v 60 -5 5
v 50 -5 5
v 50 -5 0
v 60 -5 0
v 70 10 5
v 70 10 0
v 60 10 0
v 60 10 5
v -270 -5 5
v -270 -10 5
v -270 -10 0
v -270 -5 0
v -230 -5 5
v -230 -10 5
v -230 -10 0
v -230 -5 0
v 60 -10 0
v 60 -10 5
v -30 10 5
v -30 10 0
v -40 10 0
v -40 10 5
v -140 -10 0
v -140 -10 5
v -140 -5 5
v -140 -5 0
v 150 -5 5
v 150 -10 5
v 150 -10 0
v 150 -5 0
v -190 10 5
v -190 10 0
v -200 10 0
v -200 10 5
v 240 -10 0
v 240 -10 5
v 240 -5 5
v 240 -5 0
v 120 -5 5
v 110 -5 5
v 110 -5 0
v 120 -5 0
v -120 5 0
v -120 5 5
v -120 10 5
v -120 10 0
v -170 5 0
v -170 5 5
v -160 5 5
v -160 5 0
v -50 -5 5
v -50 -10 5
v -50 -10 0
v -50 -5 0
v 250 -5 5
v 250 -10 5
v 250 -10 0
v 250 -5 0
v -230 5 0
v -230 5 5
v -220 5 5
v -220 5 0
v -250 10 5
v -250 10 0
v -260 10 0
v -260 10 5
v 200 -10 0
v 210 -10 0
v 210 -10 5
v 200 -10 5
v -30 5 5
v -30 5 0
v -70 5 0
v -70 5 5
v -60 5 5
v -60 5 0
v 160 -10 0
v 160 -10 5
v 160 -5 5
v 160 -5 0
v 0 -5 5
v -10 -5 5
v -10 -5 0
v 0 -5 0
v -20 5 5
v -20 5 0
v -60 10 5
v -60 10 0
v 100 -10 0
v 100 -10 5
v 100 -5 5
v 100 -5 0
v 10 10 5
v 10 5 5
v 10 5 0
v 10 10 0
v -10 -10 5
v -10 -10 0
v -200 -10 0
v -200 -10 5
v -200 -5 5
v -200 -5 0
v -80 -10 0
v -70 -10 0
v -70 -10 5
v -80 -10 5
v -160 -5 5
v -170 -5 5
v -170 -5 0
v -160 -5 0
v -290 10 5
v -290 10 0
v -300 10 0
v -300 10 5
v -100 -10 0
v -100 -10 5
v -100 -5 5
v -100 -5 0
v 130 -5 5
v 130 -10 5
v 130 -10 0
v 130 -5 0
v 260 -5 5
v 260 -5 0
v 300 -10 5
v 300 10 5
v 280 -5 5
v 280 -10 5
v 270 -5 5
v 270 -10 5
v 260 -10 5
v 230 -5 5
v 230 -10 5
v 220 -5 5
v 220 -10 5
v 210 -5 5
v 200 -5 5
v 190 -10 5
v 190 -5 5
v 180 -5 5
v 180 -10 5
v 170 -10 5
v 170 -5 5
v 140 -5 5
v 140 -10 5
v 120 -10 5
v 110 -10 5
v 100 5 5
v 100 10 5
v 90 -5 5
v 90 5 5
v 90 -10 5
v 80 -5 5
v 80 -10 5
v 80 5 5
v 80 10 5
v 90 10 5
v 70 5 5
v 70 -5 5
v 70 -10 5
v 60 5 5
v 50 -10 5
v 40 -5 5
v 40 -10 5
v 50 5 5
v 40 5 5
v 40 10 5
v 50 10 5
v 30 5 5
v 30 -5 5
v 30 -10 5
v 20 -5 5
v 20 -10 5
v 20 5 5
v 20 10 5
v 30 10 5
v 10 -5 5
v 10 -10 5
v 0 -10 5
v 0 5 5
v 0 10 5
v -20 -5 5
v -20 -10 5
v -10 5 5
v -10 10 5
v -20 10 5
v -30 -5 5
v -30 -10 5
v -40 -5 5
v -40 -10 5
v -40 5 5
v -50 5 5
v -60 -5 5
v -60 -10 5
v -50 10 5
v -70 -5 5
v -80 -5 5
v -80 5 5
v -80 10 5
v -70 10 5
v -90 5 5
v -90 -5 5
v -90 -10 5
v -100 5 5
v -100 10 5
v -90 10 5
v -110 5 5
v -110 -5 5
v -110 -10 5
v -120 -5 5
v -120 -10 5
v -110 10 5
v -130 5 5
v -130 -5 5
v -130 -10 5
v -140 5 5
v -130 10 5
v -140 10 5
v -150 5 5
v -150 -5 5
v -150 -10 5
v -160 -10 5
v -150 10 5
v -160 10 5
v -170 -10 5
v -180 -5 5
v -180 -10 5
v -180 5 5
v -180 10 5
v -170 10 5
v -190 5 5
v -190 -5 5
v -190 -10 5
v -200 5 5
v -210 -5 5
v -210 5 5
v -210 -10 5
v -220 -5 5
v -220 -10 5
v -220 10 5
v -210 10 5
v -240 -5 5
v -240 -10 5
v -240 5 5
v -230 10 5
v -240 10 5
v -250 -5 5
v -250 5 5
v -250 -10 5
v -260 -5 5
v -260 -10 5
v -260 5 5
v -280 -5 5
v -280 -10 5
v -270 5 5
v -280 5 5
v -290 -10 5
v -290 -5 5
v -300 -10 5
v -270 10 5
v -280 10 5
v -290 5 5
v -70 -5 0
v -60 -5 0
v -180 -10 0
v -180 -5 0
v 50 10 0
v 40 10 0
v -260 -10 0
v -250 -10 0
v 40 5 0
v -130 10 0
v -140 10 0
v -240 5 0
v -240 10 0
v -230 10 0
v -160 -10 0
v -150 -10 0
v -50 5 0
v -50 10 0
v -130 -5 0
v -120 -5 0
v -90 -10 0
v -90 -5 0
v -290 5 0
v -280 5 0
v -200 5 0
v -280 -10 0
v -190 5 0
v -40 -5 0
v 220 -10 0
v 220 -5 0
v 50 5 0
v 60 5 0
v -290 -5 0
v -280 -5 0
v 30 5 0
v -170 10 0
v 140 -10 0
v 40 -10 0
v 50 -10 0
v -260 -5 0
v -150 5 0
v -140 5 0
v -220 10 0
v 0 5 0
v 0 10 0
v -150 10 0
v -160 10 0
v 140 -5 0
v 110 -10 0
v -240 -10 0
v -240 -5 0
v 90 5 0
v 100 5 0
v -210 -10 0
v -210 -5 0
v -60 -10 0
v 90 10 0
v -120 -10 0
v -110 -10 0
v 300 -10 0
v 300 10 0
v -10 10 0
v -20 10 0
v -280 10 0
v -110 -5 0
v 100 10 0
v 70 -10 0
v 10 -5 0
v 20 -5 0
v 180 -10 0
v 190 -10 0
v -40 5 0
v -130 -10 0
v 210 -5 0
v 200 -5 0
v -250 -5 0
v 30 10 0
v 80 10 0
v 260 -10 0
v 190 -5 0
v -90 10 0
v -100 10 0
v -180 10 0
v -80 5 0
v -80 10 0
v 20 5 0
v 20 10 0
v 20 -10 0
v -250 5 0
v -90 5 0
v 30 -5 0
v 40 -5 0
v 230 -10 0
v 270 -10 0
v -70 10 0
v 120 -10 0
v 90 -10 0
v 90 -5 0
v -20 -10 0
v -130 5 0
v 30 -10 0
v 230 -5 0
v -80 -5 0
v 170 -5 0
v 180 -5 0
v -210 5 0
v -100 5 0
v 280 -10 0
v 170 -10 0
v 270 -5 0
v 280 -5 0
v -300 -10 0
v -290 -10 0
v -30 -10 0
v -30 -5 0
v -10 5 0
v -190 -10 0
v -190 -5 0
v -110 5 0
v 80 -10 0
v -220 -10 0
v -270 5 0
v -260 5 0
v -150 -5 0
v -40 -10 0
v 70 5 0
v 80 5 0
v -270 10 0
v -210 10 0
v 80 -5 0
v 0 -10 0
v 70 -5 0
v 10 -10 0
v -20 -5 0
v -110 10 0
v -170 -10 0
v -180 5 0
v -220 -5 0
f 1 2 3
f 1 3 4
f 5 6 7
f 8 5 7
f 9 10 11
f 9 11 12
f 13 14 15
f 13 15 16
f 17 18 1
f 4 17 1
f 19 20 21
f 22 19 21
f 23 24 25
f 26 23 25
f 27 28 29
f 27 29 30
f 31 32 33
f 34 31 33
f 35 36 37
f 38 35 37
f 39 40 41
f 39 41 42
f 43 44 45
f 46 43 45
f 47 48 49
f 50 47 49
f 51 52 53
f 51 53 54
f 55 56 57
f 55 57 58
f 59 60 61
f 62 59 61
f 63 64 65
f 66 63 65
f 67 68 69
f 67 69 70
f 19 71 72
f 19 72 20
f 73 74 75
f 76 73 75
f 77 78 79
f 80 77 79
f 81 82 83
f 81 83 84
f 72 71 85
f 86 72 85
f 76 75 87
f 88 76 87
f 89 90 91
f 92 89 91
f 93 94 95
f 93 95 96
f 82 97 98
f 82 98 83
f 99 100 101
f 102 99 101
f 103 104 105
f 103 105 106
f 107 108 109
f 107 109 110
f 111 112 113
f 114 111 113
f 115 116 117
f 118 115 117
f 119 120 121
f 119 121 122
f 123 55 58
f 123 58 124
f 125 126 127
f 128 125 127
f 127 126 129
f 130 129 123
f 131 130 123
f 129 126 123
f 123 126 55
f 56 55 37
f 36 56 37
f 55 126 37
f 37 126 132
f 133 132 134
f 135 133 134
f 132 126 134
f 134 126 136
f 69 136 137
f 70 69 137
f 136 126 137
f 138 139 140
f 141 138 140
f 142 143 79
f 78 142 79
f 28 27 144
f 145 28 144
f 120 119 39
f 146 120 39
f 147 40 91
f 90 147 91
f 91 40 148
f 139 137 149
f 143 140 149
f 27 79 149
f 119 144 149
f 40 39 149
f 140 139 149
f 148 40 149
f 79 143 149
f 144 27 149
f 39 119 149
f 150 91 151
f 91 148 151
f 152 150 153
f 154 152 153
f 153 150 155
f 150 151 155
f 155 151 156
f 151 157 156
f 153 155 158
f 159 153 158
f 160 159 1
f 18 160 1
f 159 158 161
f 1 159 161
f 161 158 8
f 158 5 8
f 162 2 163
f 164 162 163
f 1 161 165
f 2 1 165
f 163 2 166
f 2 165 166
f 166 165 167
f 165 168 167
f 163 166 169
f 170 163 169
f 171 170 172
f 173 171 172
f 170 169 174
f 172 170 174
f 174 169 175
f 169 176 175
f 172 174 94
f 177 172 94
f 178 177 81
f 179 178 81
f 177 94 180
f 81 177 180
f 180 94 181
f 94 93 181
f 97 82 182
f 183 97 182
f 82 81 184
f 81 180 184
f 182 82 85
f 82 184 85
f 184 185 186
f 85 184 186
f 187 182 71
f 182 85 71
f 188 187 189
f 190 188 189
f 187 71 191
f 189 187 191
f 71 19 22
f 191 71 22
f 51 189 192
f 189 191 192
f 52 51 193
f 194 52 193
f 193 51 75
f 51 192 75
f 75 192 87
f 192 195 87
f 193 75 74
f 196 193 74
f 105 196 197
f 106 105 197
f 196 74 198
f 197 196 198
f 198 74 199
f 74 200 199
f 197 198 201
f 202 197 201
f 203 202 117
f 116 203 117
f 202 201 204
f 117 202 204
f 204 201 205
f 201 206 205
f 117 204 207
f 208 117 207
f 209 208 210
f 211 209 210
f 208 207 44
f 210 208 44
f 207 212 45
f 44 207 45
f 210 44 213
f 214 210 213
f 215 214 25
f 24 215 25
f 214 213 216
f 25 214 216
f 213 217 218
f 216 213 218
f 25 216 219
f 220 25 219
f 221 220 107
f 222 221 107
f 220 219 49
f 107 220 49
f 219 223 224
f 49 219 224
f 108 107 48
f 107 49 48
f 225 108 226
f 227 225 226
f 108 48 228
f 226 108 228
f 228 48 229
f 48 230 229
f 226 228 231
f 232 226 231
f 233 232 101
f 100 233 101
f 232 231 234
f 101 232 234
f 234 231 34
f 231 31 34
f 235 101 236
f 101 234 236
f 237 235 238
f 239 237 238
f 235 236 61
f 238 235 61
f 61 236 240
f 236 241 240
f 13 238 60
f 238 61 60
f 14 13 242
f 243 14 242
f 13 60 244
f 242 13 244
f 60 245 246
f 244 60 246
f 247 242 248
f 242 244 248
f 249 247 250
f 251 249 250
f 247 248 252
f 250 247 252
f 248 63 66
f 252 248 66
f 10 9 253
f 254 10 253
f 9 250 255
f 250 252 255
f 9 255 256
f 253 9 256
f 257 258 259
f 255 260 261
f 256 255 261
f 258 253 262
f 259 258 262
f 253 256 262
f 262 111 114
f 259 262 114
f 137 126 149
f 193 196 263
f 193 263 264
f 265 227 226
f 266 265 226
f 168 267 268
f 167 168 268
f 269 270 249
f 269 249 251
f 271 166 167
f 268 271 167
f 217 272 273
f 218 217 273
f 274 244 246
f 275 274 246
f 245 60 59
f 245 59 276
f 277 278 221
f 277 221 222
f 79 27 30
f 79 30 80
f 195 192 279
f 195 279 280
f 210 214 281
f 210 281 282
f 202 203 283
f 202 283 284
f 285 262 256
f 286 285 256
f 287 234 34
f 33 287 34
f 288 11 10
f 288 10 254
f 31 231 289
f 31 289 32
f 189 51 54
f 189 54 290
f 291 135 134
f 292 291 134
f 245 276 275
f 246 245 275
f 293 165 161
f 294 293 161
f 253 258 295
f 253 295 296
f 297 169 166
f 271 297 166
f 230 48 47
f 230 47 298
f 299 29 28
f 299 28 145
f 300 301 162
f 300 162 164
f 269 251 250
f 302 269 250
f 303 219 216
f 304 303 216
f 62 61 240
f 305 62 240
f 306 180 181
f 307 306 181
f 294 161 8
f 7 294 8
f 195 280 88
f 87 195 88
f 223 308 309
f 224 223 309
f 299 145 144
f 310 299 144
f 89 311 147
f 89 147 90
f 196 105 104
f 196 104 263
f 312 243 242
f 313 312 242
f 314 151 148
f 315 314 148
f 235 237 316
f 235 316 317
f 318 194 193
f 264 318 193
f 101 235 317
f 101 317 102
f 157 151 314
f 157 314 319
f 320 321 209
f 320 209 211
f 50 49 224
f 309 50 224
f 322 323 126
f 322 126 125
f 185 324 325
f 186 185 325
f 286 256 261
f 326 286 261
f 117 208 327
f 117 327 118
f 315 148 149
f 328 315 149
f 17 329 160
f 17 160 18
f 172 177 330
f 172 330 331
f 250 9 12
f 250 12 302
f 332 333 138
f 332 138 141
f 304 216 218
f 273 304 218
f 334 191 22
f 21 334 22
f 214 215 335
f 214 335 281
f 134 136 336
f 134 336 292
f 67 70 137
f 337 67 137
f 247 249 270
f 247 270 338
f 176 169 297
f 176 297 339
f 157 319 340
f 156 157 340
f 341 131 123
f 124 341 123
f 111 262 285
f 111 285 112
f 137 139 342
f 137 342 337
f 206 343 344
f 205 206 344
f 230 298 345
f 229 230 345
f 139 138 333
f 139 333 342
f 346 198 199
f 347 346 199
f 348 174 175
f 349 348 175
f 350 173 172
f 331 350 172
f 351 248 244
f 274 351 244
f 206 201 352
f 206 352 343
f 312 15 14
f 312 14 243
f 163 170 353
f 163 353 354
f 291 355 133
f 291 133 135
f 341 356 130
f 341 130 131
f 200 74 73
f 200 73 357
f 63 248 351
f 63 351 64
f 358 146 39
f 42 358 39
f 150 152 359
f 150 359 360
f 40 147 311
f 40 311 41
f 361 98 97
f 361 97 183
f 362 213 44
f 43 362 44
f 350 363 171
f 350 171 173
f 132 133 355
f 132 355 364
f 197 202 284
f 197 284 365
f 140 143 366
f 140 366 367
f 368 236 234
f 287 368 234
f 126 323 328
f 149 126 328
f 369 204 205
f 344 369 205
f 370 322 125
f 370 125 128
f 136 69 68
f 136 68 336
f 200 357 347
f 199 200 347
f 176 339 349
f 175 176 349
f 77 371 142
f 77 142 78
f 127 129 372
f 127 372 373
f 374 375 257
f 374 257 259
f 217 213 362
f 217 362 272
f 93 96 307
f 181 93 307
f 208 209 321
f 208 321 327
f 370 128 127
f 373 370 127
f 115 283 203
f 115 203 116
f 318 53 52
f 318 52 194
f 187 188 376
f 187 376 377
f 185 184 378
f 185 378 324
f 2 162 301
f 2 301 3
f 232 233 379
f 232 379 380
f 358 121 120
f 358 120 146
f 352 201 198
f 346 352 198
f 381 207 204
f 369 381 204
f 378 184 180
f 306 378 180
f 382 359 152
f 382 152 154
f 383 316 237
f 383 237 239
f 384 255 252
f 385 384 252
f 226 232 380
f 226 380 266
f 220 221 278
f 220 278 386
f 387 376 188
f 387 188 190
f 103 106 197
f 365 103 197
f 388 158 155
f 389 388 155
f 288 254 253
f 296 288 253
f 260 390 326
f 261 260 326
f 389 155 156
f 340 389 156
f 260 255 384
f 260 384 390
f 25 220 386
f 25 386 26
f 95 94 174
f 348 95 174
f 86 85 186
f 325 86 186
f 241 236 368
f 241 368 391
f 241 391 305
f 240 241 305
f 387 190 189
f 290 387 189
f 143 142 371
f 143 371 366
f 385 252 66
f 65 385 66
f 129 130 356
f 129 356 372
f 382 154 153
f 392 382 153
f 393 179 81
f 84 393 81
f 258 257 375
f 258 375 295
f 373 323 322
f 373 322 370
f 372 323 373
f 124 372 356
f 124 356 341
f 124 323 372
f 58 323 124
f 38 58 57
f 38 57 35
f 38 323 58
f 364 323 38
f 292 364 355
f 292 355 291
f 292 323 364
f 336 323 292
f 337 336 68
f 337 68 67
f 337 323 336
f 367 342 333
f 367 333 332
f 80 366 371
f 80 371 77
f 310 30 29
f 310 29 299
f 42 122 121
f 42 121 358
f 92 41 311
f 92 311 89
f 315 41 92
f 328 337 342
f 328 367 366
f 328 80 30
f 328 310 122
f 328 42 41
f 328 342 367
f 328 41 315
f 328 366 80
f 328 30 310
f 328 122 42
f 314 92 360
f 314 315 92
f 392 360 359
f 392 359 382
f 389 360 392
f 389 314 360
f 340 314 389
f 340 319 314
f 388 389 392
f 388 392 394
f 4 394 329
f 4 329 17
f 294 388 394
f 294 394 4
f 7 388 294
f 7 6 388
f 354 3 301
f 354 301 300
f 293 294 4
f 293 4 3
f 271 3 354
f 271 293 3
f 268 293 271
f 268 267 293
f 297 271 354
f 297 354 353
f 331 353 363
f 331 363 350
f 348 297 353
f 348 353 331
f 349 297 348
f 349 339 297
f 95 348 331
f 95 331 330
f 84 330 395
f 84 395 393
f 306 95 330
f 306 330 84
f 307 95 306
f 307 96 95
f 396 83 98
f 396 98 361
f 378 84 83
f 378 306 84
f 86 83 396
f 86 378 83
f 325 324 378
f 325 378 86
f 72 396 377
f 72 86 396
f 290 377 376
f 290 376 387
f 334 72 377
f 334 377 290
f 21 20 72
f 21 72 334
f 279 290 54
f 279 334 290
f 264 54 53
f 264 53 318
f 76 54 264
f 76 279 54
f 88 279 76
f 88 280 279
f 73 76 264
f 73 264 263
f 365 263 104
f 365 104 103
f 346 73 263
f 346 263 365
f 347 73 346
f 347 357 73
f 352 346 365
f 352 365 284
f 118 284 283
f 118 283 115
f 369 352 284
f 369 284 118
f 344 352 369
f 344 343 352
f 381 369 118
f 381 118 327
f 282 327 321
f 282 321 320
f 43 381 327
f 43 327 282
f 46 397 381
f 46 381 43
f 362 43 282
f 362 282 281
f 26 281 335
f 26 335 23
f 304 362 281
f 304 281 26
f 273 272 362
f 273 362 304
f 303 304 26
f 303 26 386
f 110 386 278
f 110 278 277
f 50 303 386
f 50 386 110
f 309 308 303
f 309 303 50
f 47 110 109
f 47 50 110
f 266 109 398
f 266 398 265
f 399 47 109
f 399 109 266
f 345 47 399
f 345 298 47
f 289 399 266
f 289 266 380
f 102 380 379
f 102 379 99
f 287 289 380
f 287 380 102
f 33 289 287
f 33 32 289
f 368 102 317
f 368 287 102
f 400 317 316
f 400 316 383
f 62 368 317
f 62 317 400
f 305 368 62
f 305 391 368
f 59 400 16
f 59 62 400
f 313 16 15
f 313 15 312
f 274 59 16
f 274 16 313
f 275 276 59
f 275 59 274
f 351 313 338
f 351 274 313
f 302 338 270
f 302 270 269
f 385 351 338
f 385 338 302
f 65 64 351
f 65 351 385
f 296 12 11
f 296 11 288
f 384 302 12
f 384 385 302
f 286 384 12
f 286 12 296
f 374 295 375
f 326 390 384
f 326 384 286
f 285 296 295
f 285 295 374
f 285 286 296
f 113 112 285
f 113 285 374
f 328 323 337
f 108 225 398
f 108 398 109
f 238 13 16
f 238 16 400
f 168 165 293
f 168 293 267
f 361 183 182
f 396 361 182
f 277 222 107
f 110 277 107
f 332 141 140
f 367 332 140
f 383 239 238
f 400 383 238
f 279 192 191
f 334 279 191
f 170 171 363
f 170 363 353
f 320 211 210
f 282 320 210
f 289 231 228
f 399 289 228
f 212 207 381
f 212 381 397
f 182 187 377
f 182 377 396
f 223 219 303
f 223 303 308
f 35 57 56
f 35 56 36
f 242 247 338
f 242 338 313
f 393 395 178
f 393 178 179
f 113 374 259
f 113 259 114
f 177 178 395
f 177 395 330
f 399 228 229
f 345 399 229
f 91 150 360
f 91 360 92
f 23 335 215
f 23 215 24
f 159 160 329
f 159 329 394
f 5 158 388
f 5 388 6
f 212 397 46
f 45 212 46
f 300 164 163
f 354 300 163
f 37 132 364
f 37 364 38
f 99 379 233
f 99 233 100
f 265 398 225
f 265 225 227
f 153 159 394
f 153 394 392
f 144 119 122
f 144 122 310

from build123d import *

# Parameters (mm, degrees)
BOSS_EXTRU_1_DEPTH      = 5
ESQUISSE3_W             = 10
ESQUISSE3_H             = 5
ENL_V_MAT_EXTRU_1_DEPTH = 301.208261046


with BuildPart() as part:
    # Esquisse1 → Boss.-Extru.1 (new body)
    with BuildSketch(Plane.XY):
        Polygon((-300, 10), (200, 10), (300, 10), (300, -10), (-300, -10), align=None)
    extrude(amount=BOSS_EXTRU_1_DEPTH)

    # Esquisse3 → Enlèv. mat.-Extru.1 (cut, through all)
    with BuildSketch(Plane.XY.offset(5)):
        with Locations((-285, -7.5)):
            Rectangle(ESQUISSE3_W, ESQUISSE3_H)
        with Locations((-265, -7.5)):
            Rectangle(ESQUISSE3_W, ESQUISSE3_H)
        with Locations((-245, -7.5)):
            Rectangle(ESQUISSE3_W, ESQUISSE3_H)
        with Locations((-225, -7.5)):
            Rectangle(ESQUISSE3_W, ESQUISSE3_H)
        with Locations((-205, -7.5)):
            Rectangle(ESQUISSE3_W, ESQUISSE3_H)
        with Locations((-185, -7.5)):
            Rectangle(ESQUISSE3_W, ESQUISSE3_H)
        with Locations((-165, -7.5)):
            Rectangle(ESQUISSE3_W, ESQUISSE3_H)
        with Locations((-145, -7.5)):
            Rectangle(ESQUISSE3_W, ESQUISSE3_H)
        with Locations((-125, -7.5)):
            Rectangle(ESQUISSE3_W, ESQUISSE3_H)
        with Locations((-105, -7.5)):
            Rectangle(ESQUISSE3_W, ESQUISSE3_H)
        with Locations((-85, -7.5)):
            Rectangle(ESQUISSE3_W, ESQUISSE3_H)
        with Locations((-65, -7.5)):
            Rectangle(ESQUISSE3_W, ESQUISSE3_H)
        with Locations((-45, -7.5)):
            Rectangle(ESQUISSE3_W, ESQUISSE3_H)
        with Locations((-25, -7.5)):
            Rectangle(ESQUISSE3_W, ESQUISSE3_H)
        with Locations((-5, -7.5)):
            Rectangle(ESQUISSE3_W, ESQUISSE3_H)
        with Locations((15, -7.5)):
            Rectangle(ESQUISSE3_W, ESQUISSE3_H)
        with Locations((35, -7.5)):
            Rectangle(ESQUISSE3_W, ESQUISSE3_H)
        with Locations((55, -7.5)):
            Rectangle(ESQUISSE3_W, ESQUISSE3_H)
        with Locations((75, -7.5)):
            Rectangle(ESQUISSE3_W, ESQUISSE3_H)
        with Locations((95, -7.5)):
            Rectangle(ESQUISSE3_W, ESQUISSE3_H)
        with Locations((115, -7.5)):
            Rectangle(ESQUISSE3_W, ESQUISSE3_H)
        with Locations((135, -7.5)):
            Rectangle(ESQUISSE3_W, ESQUISSE3_H)
        with Locations((155, -7.5)):
            Rectangle(ESQUISSE3_W, ESQUISSE3_H)
        with Locations((175, -7.5)):
            Rectangle(ESQUISSE3_W, ESQUISSE3_H)
        with Locations((195, -7.5)):
            Rectangle(ESQUISSE3_W, ESQUISSE3_H)
        with Locations((215, -7.5)):
            Rectangle(ESQUISSE3_W, ESQUISSE3_H)
        with Locations((235, -7.5)):
            Rectangle(ESQUISSE3_W, ESQUISSE3_H)
        with Locations((255, -7.5)):
            Rectangle(ESQUISSE3_W, ESQUISSE3_H)
        with Locations((275, -7.5)):
            Rectangle(ESQUISSE3_W, ESQUISSE3_H)
        with Locations((-285, 7.5)):
            Rectangle(ESQUISSE3_W, ESQUISSE3_H)
        with Locations((-265, 7.5)):
            Rectangle(ESQUISSE3_W, ESQUISSE3_H)
        with Locations((-245, 7.5)):
            Rectangle(ESQUISSE3_W, ESQUISSE3_H)
        with Locations((-225, 7.5)):
            Rectangle(ESQUISSE3_W, ESQUISSE3_H)
        with Locations((-205, 7.5)):
            Rectangle(ESQUISSE3_W, ESQUISSE3_H)
        with Locations((-185, 7.5)):
            Rectangle(ESQUISSE3_W, ESQUISSE3_H)
        with Locations((-165, 7.5)):
            Rectangle(ESQUISSE3_W, ESQUISSE3_H)
        with Locations((-145, 7.5)):
            Rectangle(ESQUISSE3_W, ESQUISSE3_H)
        with Locations((-125, 7.5)):
            Rectangle(ESQUISSE3_W, ESQUISSE3_H)
        with Locations((-105, 7.5)):
            Rectangle(ESQUISSE3_W, ESQUISSE3_H)
        with Locations((-85, 7.5)):
            Rectangle(ESQUISSE3_W, ESQUISSE3_H)
        with Locations((-65, 7.5)):
            Rectangle(ESQUISSE3_W, ESQUISSE3_H)
        with Locations((-45, 7.5)):
            Rectangle(ESQUISSE3_W, ESQUISSE3_H)
        with Locations((-25, 7.5)):
            Rectangle(ESQUISSE3_W, ESQUISSE3_H)
        with Locations((-5, 7.5)):
            Rectangle(ESQUISSE3_W, ESQUISSE3_H)
        with Locations((15, 7.5)):
            Rectangle(ESQUISSE3_W, ESQUISSE3_H)
        with Locations((35, 7.5)):
            Rectangle(ESQUISSE3_W, ESQUISSE3_H)
        with Locations((55, 7.5)):
            Rectangle(ESQUISSE3_W, ESQUISSE3_H)
        with Locations((75, 7.5)):
            Rectangle(ESQUISSE3_W, ESQUISSE3_H)
        with Locations((95, 7.5)):
            Rectangle(ESQUISSE3_W, ESQUISSE3_H)
    extrude(amount=-ENL_V_MAT_EXTRU_1_DEPTH, mode=Mode.SUBTRACT)


solid = part.part
